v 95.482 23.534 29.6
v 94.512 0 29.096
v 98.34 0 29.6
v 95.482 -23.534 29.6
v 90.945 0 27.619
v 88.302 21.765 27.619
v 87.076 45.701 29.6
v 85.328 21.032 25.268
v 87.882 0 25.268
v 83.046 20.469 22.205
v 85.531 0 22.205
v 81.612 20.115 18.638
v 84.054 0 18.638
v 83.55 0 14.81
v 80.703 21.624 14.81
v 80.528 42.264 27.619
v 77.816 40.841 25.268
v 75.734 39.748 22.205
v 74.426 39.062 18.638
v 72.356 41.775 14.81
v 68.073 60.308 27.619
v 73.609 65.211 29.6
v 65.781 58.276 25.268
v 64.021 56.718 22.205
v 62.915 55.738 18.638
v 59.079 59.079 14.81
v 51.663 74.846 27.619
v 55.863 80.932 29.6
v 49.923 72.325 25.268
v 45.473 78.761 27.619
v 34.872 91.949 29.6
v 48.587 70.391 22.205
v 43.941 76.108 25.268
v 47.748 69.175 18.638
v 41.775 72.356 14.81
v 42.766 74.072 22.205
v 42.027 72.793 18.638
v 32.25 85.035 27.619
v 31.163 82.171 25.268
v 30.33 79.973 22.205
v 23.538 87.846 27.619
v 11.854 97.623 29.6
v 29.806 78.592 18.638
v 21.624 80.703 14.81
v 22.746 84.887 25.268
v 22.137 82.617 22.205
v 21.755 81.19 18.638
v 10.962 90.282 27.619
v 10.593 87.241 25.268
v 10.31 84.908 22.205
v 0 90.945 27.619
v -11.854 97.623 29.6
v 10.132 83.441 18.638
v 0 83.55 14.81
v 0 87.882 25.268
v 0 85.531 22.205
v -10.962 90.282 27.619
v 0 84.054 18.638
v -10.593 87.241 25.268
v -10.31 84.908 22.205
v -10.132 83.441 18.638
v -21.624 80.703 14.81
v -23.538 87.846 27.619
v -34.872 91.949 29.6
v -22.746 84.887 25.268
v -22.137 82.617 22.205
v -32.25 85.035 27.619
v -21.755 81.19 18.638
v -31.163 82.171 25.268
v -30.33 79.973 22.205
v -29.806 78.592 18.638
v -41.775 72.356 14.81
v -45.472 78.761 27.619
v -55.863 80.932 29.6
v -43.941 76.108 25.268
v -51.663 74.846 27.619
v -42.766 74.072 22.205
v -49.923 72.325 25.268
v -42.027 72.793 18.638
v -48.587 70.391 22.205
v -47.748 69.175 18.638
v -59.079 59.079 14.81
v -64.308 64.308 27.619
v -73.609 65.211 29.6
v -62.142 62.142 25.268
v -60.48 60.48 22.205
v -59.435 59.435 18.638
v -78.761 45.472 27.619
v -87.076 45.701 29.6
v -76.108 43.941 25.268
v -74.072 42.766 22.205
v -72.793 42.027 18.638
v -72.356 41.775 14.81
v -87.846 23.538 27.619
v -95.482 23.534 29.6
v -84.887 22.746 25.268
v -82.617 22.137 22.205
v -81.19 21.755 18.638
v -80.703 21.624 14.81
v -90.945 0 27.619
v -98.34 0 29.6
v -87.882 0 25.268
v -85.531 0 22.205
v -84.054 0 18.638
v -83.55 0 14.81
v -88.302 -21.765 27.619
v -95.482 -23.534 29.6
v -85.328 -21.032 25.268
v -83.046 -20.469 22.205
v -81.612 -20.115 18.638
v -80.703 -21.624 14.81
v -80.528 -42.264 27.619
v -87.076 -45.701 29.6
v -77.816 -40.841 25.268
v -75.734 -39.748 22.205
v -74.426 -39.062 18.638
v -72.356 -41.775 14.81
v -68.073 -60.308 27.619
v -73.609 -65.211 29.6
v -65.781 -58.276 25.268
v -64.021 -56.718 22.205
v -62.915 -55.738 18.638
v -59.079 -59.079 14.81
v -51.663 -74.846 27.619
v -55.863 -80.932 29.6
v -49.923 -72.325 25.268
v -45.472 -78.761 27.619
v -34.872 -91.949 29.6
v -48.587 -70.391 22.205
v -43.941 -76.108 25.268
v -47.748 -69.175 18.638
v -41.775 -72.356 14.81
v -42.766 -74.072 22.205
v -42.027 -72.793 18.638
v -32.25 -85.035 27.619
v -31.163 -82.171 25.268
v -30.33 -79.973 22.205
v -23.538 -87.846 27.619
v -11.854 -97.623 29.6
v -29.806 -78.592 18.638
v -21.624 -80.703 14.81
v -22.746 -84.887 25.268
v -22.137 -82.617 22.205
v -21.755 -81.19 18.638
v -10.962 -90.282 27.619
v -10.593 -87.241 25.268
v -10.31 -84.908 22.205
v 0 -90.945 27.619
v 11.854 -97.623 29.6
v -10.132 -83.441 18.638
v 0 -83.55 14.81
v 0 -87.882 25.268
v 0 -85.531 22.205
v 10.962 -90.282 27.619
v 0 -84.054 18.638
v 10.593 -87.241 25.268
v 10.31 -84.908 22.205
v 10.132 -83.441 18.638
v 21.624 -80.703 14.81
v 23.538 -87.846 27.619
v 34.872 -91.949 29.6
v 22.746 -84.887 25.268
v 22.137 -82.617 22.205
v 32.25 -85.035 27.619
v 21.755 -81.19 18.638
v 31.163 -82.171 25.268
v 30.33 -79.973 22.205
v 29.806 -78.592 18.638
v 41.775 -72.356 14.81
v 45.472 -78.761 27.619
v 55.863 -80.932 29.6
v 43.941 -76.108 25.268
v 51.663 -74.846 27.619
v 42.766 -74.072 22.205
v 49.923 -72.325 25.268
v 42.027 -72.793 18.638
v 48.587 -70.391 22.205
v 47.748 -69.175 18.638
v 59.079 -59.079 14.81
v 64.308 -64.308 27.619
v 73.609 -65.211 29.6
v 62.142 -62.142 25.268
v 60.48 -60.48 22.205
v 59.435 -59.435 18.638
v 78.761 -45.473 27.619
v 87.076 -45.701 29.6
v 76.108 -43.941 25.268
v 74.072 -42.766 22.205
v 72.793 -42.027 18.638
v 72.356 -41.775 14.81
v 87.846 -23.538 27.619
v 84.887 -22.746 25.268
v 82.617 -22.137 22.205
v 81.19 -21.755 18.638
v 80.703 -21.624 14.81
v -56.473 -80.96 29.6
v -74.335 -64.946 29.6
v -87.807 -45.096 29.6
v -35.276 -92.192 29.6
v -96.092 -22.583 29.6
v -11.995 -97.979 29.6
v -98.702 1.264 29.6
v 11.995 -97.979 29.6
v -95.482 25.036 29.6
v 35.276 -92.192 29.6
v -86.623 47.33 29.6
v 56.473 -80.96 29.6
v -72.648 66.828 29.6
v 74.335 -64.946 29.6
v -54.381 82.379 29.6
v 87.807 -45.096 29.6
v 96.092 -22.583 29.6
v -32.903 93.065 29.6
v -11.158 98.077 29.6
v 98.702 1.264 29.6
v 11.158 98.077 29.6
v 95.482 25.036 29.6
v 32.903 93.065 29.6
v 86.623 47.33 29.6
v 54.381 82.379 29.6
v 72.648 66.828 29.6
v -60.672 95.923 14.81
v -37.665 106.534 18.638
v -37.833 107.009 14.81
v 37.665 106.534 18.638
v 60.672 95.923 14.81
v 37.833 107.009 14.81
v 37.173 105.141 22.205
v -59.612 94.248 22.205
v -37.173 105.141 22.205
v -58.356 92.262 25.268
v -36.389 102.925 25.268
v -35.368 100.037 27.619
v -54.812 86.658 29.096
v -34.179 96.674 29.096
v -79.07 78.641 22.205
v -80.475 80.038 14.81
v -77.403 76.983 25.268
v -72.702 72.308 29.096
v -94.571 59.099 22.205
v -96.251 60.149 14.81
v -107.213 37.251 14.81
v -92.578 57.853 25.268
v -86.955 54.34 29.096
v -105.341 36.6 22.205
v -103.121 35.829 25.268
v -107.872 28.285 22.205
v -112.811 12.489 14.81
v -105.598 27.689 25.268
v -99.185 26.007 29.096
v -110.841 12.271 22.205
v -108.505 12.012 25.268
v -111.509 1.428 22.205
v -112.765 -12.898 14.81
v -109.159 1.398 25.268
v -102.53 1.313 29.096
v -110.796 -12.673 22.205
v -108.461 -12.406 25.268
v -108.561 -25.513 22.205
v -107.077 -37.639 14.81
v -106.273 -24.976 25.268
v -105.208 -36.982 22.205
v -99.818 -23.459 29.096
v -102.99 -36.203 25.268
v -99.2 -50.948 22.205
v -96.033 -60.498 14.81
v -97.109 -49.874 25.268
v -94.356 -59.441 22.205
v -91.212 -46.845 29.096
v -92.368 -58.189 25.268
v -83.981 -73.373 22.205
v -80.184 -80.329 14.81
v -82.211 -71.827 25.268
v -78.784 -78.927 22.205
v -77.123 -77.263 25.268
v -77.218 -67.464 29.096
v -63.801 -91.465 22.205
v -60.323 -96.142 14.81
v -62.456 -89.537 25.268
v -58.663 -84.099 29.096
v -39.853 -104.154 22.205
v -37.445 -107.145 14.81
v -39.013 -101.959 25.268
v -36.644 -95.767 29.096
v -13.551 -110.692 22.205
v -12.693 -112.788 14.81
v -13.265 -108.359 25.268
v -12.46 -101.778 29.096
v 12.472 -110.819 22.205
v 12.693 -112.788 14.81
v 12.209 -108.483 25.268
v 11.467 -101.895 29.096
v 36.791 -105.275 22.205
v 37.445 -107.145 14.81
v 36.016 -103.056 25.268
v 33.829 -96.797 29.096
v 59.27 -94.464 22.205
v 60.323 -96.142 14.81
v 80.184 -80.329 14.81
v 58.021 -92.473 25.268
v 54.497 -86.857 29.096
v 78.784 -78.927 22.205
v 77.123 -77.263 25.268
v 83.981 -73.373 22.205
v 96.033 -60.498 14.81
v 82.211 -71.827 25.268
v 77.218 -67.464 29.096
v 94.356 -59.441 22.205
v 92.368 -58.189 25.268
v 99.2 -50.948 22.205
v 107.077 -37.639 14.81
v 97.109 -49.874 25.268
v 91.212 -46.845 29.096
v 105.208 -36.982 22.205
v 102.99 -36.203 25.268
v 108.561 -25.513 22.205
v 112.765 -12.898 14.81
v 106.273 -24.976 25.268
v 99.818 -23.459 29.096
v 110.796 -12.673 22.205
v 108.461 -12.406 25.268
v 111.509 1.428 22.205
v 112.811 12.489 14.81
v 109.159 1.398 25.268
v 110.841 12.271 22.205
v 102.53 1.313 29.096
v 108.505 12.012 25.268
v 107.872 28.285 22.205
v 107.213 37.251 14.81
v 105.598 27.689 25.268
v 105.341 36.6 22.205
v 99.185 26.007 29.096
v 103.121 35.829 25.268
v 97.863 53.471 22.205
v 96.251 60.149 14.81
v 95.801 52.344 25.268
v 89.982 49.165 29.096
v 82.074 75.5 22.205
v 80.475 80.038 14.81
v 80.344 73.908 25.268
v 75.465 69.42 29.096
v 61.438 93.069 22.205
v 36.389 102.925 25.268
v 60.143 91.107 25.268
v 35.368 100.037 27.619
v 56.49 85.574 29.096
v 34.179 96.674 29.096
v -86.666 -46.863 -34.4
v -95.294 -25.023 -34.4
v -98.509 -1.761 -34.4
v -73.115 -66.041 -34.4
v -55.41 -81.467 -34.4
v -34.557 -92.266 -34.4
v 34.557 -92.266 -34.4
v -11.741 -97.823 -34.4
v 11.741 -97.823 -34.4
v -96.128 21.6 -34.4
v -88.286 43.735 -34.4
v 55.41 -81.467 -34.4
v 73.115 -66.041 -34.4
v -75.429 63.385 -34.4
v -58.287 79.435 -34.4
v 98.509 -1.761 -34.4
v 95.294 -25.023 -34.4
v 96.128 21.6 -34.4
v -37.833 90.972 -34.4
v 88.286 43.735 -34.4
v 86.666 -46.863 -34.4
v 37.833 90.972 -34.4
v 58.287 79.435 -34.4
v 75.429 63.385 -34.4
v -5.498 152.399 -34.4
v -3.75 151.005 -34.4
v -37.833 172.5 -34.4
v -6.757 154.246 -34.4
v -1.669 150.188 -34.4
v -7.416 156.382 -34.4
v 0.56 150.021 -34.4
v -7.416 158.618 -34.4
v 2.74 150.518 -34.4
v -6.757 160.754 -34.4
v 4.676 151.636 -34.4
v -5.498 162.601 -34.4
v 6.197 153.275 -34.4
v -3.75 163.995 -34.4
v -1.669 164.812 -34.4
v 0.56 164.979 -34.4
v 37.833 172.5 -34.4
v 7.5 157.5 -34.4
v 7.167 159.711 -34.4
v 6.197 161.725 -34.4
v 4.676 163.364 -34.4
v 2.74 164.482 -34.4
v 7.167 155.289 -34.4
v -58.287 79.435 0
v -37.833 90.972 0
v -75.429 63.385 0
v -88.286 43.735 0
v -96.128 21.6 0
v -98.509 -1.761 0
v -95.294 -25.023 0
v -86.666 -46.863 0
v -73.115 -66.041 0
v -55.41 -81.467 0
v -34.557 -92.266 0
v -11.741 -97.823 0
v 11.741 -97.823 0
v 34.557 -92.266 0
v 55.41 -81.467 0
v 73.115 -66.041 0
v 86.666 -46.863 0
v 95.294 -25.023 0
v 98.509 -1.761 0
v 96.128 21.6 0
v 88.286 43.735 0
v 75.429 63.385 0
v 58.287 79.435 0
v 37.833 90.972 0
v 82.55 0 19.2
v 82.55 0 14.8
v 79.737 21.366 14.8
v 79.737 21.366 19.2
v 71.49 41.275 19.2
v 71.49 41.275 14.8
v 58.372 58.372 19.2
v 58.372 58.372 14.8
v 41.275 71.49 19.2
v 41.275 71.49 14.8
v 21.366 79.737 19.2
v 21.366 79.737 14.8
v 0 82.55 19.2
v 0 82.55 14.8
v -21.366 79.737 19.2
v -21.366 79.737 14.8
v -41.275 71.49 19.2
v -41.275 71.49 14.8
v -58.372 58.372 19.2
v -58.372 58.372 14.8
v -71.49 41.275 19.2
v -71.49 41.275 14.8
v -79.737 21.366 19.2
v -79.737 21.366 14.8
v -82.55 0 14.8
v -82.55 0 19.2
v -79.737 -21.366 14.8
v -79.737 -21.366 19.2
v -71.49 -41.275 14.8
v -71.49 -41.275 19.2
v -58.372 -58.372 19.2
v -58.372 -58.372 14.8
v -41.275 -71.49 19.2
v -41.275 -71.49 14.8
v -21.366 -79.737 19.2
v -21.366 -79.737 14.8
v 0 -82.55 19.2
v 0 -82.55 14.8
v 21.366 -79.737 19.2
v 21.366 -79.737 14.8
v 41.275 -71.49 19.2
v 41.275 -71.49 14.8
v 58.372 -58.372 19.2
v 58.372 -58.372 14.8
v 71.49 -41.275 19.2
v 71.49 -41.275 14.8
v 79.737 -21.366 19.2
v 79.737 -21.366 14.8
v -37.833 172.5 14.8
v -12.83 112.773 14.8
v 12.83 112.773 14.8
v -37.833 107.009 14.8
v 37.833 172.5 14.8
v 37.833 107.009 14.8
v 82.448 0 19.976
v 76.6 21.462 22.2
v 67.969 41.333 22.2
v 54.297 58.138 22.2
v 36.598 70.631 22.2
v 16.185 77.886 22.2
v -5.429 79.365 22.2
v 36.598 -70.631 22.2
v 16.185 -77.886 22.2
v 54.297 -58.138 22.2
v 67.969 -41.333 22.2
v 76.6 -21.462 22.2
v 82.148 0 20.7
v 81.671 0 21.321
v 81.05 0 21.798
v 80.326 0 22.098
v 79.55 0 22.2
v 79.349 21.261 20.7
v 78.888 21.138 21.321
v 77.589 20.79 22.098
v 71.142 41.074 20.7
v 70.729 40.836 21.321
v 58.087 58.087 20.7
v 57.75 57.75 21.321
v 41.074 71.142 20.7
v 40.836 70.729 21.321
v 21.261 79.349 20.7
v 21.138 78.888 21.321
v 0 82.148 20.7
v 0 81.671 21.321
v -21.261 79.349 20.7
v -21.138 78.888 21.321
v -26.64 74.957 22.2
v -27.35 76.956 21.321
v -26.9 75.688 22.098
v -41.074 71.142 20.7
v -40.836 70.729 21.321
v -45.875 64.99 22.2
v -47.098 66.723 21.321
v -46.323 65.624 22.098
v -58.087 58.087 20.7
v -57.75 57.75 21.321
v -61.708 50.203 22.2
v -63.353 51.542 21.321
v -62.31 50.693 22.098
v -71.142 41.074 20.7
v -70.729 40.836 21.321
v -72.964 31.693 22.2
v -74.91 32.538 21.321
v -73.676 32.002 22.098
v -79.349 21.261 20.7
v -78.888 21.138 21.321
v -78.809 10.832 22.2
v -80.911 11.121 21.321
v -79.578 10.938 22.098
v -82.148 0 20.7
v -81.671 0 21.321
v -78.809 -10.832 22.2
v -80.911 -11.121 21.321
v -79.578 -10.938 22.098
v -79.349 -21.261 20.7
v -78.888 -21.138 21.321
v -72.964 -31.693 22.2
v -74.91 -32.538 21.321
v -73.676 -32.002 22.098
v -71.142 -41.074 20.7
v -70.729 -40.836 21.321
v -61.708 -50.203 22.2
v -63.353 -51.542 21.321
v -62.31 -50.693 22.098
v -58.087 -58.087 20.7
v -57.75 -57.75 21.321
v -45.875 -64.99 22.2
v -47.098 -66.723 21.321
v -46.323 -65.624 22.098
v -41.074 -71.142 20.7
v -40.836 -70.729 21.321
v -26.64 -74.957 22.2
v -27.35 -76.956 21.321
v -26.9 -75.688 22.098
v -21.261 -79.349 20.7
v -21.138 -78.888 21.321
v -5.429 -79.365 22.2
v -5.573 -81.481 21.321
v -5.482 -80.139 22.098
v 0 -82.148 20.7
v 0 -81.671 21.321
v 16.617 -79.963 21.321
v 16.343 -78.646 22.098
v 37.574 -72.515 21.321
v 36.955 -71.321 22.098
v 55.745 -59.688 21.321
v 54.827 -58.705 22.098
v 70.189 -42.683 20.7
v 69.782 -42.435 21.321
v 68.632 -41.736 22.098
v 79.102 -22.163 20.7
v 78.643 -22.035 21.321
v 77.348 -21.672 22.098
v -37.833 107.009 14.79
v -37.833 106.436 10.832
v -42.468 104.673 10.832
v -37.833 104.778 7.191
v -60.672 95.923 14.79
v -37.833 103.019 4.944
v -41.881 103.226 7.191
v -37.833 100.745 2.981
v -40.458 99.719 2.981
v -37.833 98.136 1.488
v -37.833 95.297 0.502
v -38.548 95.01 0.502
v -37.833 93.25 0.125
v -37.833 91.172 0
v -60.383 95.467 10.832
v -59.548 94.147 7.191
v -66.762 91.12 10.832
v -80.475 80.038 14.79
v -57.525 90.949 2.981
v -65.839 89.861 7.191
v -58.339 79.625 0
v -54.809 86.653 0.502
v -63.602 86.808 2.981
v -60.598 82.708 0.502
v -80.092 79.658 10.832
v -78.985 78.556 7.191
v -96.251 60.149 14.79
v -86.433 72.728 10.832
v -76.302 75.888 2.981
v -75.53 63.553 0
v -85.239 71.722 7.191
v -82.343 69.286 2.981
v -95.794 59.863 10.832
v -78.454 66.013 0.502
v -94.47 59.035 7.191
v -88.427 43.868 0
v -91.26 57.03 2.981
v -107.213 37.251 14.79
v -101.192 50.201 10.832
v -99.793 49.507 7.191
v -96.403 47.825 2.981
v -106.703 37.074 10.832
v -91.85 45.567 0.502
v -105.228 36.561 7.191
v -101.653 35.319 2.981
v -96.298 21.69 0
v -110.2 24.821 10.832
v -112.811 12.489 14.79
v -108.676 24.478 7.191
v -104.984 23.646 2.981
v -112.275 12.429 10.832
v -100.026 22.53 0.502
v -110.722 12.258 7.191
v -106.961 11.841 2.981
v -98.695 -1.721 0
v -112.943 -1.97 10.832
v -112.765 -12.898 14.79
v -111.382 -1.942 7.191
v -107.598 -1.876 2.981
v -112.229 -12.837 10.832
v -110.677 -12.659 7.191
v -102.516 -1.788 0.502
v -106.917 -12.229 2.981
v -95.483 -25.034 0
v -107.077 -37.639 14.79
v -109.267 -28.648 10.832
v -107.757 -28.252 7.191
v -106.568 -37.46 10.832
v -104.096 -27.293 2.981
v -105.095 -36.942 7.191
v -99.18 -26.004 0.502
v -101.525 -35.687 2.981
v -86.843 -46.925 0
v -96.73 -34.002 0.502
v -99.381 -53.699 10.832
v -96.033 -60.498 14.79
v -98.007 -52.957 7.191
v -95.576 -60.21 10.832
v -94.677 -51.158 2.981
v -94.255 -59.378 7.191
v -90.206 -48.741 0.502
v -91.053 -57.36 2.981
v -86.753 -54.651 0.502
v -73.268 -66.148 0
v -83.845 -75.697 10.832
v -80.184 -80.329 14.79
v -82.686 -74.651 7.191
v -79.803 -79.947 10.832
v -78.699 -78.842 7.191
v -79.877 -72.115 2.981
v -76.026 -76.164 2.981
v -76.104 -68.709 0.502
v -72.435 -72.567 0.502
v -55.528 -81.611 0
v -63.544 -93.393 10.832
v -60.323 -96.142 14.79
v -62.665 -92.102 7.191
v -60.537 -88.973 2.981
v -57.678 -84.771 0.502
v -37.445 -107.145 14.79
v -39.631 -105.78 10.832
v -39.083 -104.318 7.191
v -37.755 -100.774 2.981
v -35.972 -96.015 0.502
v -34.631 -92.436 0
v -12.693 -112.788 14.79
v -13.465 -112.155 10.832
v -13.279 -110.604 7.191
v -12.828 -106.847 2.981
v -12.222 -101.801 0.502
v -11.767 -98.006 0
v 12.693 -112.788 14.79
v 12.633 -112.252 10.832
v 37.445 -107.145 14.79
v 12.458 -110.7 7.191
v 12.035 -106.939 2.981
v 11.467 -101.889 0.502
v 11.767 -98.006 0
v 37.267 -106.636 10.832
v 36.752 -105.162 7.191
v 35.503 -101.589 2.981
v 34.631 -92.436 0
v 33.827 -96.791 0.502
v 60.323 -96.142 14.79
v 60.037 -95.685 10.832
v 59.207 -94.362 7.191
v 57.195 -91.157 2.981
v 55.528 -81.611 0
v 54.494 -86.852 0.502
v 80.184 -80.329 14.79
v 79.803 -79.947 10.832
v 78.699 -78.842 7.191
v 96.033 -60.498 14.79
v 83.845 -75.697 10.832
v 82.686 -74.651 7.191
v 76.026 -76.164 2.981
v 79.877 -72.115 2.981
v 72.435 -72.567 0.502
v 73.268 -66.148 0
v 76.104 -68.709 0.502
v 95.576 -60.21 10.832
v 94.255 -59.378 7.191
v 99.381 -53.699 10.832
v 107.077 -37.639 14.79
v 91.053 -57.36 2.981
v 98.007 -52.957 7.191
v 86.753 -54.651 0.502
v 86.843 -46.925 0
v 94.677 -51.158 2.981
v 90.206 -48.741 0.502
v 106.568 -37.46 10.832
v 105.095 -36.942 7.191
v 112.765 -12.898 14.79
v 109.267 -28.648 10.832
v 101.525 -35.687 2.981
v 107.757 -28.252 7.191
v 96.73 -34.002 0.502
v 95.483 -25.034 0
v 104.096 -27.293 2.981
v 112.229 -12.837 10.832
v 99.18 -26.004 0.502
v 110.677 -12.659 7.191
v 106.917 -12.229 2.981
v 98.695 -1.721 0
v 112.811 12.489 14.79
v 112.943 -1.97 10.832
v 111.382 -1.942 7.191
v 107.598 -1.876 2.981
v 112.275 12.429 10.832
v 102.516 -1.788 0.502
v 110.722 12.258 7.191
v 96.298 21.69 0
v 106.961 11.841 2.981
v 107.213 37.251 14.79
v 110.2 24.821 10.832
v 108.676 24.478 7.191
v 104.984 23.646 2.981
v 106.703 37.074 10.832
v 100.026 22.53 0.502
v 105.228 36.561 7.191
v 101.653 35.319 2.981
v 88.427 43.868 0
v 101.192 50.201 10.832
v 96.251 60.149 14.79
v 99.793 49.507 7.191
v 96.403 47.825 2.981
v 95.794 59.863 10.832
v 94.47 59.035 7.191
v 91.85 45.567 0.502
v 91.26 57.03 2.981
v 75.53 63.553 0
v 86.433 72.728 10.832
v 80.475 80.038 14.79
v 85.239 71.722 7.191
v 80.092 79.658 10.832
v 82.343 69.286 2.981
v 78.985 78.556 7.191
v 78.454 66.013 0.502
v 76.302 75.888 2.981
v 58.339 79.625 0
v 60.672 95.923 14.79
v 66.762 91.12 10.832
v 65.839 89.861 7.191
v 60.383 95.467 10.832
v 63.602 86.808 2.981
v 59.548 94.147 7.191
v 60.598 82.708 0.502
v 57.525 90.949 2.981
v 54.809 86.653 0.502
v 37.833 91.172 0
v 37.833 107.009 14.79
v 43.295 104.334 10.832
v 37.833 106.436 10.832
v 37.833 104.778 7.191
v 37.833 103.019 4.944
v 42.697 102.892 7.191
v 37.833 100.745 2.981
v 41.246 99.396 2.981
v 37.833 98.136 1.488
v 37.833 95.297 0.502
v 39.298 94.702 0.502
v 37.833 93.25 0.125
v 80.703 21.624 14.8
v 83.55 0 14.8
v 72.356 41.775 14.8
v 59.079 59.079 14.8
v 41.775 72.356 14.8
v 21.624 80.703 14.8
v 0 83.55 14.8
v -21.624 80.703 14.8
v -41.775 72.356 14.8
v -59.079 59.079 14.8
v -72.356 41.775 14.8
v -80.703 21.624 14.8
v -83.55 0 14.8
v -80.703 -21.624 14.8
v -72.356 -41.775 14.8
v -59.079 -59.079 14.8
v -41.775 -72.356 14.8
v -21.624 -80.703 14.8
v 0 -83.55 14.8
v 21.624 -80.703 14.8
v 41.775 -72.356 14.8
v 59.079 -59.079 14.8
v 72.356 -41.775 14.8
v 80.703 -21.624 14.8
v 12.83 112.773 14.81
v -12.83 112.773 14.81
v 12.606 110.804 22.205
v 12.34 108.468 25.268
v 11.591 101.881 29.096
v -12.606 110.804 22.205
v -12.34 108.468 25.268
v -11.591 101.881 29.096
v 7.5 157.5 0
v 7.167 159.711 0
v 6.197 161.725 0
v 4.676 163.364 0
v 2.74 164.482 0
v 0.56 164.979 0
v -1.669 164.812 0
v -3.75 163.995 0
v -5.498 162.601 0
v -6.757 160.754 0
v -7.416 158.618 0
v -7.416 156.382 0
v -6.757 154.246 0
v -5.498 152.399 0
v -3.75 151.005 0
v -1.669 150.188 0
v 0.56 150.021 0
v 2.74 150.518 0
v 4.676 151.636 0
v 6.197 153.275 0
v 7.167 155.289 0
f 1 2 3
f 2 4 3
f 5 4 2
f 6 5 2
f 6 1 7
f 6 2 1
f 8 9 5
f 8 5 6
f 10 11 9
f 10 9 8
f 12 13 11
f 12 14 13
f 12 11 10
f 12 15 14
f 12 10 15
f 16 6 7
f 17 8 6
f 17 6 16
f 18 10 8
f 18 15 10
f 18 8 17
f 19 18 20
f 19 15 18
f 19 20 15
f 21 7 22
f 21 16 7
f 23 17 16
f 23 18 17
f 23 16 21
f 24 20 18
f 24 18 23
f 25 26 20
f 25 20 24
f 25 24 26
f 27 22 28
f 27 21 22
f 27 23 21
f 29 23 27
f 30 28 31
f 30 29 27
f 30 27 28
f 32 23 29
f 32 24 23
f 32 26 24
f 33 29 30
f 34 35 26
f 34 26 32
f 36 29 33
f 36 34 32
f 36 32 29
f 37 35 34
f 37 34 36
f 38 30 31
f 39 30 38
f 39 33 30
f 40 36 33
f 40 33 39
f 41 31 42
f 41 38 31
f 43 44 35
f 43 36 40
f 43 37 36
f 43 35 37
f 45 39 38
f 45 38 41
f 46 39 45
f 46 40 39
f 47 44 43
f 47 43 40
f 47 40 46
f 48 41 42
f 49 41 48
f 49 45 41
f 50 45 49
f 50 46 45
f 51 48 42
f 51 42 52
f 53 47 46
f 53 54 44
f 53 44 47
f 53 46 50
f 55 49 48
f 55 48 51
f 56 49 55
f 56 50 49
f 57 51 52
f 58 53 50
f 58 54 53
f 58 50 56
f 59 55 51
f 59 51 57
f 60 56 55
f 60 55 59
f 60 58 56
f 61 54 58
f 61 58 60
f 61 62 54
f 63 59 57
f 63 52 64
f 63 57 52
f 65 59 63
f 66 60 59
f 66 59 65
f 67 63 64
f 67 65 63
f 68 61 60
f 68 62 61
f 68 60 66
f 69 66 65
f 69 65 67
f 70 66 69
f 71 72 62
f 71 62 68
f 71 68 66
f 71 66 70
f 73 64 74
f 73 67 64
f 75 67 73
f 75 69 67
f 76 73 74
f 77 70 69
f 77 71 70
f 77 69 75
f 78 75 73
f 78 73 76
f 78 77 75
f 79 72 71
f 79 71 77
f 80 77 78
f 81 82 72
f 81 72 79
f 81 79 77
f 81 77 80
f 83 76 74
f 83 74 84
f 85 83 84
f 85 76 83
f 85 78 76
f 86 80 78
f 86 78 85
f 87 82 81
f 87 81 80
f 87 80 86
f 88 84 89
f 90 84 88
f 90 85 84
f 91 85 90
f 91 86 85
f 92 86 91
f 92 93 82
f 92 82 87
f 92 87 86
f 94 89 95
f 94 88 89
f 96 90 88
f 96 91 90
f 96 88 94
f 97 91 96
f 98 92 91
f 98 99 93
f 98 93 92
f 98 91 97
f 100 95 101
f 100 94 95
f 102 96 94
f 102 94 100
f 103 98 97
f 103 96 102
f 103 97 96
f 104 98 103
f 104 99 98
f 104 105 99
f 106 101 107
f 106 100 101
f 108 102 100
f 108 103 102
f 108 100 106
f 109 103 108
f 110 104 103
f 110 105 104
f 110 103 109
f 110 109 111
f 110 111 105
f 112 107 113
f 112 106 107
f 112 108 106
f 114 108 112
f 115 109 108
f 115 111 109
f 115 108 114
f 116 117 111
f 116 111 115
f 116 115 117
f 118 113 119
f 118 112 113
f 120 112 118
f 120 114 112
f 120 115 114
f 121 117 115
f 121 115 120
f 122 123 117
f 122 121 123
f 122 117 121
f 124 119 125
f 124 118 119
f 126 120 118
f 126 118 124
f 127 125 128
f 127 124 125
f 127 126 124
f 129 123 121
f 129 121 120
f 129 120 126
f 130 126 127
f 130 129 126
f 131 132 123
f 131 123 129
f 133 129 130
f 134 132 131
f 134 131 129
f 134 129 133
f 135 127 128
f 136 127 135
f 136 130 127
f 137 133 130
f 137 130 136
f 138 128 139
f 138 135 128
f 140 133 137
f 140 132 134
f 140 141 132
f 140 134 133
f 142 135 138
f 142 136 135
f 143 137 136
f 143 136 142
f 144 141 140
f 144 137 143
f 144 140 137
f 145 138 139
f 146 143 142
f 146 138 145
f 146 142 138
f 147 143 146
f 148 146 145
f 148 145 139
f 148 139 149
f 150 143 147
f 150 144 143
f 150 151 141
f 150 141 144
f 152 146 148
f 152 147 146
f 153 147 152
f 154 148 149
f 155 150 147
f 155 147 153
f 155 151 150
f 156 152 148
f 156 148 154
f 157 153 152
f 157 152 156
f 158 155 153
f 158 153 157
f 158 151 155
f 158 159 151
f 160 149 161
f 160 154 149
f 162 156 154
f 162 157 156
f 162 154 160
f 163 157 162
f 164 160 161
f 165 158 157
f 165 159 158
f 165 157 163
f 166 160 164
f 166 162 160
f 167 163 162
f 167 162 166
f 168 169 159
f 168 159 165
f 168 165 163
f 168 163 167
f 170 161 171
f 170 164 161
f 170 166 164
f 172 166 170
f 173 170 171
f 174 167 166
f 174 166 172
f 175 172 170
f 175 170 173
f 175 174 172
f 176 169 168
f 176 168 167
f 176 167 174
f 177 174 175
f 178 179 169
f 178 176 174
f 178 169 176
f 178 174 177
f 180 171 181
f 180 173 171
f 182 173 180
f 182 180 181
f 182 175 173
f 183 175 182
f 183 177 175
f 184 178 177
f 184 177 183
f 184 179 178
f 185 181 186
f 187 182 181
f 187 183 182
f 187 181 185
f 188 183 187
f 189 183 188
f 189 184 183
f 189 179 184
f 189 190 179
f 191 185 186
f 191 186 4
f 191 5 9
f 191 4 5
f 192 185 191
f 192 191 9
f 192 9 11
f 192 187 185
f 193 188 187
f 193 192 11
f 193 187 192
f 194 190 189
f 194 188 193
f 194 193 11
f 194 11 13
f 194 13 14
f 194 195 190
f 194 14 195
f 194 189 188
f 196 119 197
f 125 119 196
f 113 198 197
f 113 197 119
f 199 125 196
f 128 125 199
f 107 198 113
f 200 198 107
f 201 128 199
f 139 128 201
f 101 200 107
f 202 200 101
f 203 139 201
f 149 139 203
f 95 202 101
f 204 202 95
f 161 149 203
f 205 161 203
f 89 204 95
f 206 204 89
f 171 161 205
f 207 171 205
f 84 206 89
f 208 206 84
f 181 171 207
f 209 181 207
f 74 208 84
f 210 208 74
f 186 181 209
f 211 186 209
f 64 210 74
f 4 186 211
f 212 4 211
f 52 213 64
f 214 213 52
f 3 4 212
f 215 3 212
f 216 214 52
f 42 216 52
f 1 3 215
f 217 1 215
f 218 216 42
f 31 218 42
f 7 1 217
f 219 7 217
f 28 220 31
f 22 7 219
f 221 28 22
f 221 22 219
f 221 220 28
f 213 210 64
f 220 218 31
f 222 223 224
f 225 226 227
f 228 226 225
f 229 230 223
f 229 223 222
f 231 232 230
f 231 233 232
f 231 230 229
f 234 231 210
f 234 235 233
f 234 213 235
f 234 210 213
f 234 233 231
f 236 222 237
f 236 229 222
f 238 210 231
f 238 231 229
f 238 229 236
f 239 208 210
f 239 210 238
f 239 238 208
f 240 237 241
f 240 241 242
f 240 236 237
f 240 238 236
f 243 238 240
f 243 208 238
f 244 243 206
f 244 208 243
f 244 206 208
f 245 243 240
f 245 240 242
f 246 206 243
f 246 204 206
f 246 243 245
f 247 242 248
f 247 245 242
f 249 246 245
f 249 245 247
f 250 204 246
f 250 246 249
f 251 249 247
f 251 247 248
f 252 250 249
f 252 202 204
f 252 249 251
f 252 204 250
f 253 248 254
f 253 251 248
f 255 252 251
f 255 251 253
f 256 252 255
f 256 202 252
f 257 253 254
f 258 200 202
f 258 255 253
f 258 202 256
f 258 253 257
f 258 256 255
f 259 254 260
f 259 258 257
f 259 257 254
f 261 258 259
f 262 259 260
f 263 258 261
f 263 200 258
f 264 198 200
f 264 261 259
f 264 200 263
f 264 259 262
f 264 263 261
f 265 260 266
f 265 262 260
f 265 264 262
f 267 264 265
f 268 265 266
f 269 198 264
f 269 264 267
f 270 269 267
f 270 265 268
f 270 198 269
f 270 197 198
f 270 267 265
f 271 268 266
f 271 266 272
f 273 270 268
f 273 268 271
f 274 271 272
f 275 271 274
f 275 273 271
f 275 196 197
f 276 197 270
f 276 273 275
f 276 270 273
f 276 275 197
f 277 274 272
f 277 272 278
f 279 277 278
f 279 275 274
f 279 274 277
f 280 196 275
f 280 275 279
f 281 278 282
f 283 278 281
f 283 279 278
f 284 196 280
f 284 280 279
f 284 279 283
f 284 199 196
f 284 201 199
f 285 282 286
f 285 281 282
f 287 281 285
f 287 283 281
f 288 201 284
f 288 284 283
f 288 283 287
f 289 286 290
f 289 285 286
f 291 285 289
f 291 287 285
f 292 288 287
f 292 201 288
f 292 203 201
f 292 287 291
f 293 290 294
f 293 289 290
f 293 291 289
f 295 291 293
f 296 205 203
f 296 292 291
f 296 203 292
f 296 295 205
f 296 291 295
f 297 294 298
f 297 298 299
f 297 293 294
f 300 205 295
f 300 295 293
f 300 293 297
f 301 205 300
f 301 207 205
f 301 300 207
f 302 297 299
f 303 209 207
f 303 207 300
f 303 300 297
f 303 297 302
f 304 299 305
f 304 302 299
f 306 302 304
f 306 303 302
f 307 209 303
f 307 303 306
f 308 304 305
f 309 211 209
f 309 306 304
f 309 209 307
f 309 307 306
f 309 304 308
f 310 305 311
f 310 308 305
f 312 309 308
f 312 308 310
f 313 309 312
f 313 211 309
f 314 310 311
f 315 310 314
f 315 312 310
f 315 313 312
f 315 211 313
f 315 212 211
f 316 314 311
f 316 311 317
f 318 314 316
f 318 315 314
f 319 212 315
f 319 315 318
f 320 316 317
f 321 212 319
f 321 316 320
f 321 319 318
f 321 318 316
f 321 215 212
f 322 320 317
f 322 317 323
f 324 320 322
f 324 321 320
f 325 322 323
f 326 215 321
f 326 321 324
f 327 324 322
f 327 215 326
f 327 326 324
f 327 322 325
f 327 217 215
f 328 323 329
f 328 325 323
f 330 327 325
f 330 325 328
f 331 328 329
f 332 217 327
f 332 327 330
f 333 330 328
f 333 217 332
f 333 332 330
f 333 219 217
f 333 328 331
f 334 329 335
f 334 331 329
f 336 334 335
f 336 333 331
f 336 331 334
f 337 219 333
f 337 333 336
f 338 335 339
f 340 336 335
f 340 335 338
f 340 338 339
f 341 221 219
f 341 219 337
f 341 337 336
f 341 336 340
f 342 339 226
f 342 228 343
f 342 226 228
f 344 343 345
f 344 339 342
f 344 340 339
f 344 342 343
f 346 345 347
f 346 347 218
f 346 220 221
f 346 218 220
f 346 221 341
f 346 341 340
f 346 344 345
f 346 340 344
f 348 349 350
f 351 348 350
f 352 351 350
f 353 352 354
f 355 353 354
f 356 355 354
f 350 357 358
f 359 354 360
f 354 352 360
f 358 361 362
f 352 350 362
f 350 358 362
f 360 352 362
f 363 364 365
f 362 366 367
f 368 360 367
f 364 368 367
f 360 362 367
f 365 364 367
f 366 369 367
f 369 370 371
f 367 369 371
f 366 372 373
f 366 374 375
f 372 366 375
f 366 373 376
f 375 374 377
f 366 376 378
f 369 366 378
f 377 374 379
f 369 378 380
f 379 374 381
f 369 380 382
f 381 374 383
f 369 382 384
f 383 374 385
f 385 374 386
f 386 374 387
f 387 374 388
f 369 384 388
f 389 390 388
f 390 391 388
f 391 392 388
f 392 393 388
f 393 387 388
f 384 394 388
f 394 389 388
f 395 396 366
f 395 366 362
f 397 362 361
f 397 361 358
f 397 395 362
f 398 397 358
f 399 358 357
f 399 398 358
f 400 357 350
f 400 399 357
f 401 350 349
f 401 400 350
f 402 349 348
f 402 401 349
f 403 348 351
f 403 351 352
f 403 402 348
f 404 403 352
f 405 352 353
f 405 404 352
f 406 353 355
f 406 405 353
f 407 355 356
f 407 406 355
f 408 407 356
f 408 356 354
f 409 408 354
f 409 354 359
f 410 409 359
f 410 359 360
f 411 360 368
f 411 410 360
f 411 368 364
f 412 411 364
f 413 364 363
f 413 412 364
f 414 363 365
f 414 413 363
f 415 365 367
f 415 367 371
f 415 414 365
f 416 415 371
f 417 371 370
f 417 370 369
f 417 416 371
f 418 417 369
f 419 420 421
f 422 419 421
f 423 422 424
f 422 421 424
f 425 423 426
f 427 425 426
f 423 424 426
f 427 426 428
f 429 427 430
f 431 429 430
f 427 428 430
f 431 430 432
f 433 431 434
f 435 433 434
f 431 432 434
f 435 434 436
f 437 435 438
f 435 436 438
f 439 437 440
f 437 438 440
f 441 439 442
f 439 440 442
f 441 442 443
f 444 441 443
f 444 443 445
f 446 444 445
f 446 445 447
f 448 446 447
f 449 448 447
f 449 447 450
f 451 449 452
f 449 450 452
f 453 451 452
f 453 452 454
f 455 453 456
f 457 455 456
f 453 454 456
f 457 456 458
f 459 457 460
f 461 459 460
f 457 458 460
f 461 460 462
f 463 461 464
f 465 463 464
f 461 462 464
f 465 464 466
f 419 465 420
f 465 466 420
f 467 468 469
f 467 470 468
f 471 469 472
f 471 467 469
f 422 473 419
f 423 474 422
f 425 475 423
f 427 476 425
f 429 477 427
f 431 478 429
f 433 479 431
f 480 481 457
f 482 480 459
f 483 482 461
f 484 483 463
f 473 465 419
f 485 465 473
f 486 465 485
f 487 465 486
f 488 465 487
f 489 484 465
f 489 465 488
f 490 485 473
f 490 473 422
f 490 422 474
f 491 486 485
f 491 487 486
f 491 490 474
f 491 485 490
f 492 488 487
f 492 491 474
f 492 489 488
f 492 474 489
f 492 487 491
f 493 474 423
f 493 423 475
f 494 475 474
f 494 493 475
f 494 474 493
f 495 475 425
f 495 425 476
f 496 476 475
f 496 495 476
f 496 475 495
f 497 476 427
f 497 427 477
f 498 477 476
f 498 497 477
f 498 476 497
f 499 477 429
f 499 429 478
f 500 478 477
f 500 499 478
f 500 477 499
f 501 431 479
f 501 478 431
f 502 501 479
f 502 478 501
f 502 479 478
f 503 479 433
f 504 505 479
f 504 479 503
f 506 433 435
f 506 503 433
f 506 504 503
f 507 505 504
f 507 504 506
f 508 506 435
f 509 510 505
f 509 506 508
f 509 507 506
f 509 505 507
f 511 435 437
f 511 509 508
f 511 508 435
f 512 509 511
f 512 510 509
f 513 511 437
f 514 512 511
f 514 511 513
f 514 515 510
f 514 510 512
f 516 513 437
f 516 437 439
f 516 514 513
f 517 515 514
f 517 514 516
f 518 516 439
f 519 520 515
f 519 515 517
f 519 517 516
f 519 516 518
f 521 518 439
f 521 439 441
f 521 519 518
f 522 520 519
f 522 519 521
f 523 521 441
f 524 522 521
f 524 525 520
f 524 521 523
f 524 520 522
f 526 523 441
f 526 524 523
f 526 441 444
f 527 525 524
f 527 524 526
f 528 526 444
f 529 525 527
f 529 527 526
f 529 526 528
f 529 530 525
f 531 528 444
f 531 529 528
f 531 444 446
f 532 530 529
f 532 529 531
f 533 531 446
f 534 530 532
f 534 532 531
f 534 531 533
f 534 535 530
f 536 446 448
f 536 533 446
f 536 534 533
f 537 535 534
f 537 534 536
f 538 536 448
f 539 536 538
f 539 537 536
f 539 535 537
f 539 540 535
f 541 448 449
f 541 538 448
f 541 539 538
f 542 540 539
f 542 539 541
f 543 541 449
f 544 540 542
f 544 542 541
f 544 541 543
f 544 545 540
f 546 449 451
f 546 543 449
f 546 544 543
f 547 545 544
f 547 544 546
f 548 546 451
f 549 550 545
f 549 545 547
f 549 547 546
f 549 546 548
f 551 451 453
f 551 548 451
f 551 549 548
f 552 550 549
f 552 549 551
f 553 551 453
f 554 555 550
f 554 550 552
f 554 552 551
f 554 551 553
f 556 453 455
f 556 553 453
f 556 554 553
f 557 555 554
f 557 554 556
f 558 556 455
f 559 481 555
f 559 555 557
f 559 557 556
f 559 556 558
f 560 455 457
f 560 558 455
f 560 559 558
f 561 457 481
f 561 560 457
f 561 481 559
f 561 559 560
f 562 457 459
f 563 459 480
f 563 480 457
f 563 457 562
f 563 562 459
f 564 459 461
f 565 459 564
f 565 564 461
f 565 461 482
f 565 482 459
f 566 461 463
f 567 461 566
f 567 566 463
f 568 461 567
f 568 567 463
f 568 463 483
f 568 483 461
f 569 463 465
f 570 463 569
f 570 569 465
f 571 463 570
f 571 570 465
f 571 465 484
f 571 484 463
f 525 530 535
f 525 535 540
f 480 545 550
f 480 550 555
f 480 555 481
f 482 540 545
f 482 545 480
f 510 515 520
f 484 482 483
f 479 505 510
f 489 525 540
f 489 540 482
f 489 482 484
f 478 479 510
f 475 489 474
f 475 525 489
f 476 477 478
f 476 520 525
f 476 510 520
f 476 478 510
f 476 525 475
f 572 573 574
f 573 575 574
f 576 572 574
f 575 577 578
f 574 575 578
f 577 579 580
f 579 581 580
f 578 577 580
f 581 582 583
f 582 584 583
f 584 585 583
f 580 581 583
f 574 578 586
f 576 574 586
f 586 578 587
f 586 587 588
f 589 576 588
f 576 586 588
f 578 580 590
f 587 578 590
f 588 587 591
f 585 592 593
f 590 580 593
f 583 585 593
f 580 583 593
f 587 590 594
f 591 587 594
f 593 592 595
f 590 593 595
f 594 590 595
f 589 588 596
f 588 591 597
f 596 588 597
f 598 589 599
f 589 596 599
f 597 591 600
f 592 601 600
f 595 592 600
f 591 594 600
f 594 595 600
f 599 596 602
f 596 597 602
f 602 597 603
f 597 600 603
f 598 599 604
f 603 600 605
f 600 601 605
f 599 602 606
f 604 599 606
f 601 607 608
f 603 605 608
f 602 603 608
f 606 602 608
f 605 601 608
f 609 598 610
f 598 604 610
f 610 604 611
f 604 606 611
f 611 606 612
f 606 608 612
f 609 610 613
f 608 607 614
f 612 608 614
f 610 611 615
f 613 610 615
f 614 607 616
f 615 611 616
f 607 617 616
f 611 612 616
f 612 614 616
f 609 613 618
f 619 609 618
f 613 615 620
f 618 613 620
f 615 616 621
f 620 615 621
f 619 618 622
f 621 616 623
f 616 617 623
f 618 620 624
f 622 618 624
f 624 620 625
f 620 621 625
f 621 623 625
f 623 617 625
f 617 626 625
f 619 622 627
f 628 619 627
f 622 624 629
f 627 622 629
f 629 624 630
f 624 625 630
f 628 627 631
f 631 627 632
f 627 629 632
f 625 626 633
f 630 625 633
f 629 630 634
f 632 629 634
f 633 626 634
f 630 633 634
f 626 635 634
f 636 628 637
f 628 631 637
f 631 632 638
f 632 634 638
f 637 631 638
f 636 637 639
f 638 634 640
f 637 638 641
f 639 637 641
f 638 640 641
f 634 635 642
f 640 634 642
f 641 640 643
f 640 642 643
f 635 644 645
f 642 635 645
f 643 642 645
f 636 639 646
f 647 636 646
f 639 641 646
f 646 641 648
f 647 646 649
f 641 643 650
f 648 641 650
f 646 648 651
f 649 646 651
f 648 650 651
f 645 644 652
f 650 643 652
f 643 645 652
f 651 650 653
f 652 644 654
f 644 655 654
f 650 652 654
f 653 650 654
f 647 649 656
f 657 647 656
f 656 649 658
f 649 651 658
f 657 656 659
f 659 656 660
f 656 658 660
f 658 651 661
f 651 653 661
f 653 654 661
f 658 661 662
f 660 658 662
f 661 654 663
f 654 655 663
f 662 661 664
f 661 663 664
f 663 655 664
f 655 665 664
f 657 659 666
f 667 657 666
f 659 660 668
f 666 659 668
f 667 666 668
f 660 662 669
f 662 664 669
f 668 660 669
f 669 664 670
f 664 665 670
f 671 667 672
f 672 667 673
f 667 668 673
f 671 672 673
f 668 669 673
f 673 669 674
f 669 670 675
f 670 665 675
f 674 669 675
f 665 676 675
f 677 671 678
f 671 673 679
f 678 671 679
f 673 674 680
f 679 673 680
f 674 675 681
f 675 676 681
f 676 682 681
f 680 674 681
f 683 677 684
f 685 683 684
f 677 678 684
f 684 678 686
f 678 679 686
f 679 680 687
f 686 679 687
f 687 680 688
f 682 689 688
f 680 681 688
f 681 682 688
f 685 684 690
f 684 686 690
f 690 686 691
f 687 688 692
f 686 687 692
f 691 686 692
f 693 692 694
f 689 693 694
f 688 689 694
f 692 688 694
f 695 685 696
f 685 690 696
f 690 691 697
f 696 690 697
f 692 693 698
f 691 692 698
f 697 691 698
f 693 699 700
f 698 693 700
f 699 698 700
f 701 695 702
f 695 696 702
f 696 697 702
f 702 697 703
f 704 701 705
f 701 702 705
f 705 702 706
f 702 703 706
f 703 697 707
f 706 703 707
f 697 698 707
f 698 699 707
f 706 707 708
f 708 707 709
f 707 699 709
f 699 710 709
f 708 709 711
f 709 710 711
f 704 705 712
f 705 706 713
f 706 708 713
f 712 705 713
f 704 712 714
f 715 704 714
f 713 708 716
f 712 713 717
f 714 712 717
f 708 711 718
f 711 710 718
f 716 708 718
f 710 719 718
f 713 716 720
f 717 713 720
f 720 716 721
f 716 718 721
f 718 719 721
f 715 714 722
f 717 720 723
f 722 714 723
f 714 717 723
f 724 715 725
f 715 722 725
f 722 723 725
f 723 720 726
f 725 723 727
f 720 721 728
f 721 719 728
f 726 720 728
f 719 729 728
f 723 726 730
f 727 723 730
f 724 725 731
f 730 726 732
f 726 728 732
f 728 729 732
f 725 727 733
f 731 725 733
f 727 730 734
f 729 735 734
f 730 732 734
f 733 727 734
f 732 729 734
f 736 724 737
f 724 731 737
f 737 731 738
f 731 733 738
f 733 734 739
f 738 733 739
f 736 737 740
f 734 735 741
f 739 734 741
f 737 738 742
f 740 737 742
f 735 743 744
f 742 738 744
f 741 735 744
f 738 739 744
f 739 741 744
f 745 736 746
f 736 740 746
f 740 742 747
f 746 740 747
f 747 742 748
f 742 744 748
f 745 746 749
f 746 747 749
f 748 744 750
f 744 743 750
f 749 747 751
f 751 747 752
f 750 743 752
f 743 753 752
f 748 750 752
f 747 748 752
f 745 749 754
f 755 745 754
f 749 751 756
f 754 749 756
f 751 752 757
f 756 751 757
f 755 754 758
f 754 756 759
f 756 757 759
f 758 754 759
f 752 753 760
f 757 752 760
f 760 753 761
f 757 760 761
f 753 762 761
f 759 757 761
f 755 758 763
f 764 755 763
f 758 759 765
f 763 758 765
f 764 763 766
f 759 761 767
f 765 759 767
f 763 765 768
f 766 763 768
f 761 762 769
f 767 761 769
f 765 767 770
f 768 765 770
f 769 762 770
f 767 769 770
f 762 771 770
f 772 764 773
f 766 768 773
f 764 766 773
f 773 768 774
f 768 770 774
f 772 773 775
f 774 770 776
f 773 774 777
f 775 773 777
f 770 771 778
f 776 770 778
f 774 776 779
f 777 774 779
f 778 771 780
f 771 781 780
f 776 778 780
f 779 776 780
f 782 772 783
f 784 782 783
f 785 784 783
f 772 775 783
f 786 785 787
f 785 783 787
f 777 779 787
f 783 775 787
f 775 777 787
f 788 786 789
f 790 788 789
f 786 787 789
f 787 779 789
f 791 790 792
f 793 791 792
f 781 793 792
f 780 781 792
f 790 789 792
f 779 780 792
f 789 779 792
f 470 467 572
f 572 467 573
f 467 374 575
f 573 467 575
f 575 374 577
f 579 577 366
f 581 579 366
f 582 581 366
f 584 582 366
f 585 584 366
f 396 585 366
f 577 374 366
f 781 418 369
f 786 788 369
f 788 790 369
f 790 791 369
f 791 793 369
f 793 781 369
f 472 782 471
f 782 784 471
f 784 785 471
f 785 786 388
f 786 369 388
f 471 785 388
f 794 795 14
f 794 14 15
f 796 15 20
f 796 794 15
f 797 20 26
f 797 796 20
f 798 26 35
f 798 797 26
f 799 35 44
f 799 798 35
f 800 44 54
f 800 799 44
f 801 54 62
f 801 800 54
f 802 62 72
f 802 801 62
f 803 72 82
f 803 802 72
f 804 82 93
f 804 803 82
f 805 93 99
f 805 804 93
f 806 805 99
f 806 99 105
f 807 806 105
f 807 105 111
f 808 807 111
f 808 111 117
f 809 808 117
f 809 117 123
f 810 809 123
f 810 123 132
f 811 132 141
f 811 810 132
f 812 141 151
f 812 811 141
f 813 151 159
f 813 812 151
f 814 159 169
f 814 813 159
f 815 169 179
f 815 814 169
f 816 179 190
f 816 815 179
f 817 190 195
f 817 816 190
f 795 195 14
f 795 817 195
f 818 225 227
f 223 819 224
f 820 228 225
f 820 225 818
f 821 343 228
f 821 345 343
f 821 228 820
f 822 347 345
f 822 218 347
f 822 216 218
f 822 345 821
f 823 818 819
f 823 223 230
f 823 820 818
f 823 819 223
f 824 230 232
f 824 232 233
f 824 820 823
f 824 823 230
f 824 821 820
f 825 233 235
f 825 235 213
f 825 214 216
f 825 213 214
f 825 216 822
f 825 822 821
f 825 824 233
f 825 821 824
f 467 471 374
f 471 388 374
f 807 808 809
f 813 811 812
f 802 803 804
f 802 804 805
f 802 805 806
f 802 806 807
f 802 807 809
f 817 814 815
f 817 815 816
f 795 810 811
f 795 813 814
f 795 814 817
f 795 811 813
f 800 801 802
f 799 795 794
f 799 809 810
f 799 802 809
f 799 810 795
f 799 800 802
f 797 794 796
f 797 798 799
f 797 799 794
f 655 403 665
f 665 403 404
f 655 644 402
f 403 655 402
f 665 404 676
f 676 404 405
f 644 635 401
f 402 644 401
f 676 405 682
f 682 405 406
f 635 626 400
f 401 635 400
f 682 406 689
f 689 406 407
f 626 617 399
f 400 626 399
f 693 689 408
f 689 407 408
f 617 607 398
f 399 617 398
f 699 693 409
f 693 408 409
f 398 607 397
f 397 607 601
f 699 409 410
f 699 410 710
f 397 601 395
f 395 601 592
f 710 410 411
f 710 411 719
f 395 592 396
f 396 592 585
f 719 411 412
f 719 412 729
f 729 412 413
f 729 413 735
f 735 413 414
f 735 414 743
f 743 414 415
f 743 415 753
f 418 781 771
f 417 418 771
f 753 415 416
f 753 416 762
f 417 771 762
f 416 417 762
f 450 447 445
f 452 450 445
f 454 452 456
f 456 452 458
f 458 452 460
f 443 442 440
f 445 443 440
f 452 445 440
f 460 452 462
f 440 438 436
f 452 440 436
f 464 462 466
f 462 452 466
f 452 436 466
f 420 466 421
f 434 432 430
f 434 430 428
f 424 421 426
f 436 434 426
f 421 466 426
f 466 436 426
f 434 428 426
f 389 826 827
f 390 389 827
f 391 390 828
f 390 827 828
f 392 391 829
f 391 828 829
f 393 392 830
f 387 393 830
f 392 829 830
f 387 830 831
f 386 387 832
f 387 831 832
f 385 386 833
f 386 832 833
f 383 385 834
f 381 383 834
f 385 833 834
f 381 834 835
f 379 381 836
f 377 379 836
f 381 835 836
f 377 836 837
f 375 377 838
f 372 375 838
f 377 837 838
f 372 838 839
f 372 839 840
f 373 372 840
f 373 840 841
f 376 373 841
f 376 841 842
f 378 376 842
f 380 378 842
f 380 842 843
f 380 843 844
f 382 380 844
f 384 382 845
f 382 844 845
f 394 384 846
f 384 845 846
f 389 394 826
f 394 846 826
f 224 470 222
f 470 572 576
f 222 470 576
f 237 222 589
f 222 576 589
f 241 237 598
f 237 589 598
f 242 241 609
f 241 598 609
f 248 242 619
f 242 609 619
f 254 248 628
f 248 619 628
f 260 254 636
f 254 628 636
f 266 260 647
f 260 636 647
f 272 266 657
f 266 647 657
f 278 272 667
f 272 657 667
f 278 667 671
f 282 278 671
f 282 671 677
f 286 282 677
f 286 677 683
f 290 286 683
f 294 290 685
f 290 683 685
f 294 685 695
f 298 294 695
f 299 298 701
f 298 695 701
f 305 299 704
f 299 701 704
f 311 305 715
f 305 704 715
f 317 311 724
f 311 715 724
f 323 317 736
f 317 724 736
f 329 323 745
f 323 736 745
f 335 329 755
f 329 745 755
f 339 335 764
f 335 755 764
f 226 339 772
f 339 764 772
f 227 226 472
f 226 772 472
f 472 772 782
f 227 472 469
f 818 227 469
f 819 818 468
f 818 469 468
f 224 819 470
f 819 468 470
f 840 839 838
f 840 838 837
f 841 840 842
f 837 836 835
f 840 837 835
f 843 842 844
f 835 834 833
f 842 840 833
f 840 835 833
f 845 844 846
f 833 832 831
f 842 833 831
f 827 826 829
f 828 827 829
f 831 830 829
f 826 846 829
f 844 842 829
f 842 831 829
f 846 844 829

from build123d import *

# Parameters (mm, degrees)
F0_R     = 7.5
F0_R_2   = 83.55
F0_R_3   = 82.55
F3_DEPTH = 34.4
F4_DEPTH = 14.8
F5_START = 14.8
F5_DEPTH = 14.8
F6_R     = 14.79
F7_START = 14.8
F7_DEPTH = 7.4
F8_R     = 3


# Not quite as in the source:
# - a feature names something its author has since deleted; it is built from what else it names


with BuildPart() as f3:
    # F0 (on Top) → F3 (new body)
    with BuildSketch(Plane.XY):
        with BuildLine():
            ThreePointArc((-37.8333333333, 107.0088262196), (0, 113.5), (37.8333333333, 107.0088262196))
            Line((37.8333333333, 107.0088262196), (37.8333333333, 172.5))
            Line((37.8333333333, 172.5), (-37.8333333333, 172.5))
            Line((-37.8333333333, 172.5), (-37.8333333333, 107.0088262196))
        make_face()
        with Locations((0, 157.5)):
            Circle(F0_R, mode=Mode.SUBTRACT)
        with BuildLine():
            Line((37.8333333333, 90.9715038564), (37.8333333333, 107.0088262196))
            ThreePointArc((37.8333333333, 107.0088262196), (0, 113.5), (-37.8333333333, 107.0088262196))
            Line((-37.8333333333, 107.0088262196), (-37.8333333333, 90.9715038564))
            ThreePointArc((-37.8333333333, 90.9715038564), (0, 98.525), (37.8333333333, 90.9715038564))
        make_face()
        with BuildLine():
            ThreePointArc((98.525, 0), (81.9594558049, 54.6792760483), (37.8333333333, 90.9715038564))
            ThreePointArc((37.8333333333, 90.9715038564), (0, 98.525), (-37.8333333333, 90.9715038564))
            ThreePointArc((-37.8333333333, 90.9715038564), (-54.6792760483, -81.9594558049), (98.525, 0))
        make_face()
        Circle(F0_R_2, mode=Mode.SUBTRACT)
        Circle(F0_R_2)
        Circle(F0_R_3, mode=Mode.SUBTRACT)
        Circle(F0_R_3)
    extrude(amount=-F3_DEPTH)

    # F0 (on Top) → F4 (join)
    with BuildSketch(Plane.XY):
        with BuildLine():
            ThreePointArc((-37.8333333333, 107.0088262196), (-65.529255553, -92.6723619353), (113.5, 0))
            ThreePointArc((113.5, 0), (92.6723619353, 65.529255553), (37.8333333333, 107.0088262196))
            Line((37.8333333333, 107.0088262196), (37.8333333333, 90.9715038564))
            ThreePointArc((37.8333333333, 90.9715038564), (81.9594558049, 54.6792760483), (98.525, 0))
            ThreePointArc((98.525, 0), (-54.6792760483, -81.9594558049), (-37.8333333333, 90.9715038564))
            Line((-37.8333333333, 90.9715038564), (-37.8333333333, 107.0088262196))
        make_face()
        with BuildLine():
            ThreePointArc((98.525, 0), (81.9594558049, 54.6792760483), (37.8333333333, 90.9715038564))
            ThreePointArc((37.8333333333, 90.9715038564), (0, 98.525), (-37.8333333333, 90.9715038564))
            ThreePointArc((-37.8333333333, 90.9715038564), (-54.6792760483, -81.9594558049), (98.525, 0))
        make_face()
        Circle(F0_R_2, mode=Mode.SUBTRACT)
        Circle(F0_R_2)
        Circle(F0_R_3, mode=Mode.SUBTRACT)
        Circle(F0_R_3)
        with BuildLine():
            Line((37.8333333333, 90.9715038564), (37.8333333333, 107.0088262196))
            ThreePointArc((37.8333333333, 107.0088262196), (0, 113.5), (-37.8333333333, 107.0088262196))
            Line((-37.8333333333, 107.0088262196), (-37.8333333333, 90.9715038564))
            ThreePointArc((-37.8333333333, 90.9715038564), (0, 98.525), (37.8333333333, 90.9715038564))
        make_face()
        with BuildLine():
            ThreePointArc((-37.8333333333, 107.0088262196), (0, 113.5), (37.8333333333, 107.0088262196))
            Line((37.8333333333, 107.0088262196), (37.8333333333, 172.5))
            Line((37.8333333333, 172.5), (-37.8333333333, 172.5))
            Line((-37.8333333333, 172.5), (-37.8333333333, 107.0088262196))
        make_face()
        with Locations((0, 157.5)):
            Circle(F0_R, mode=Mode.SUBTRACT)
        with Locations((0, 157.5)):
            Circle(F0_R)
    extrude(amount=F4_DEPTH)

    # F0 (on Top) → F5 (join)
    with BuildSketch(Plane.XY.offset(F5_START)):
        with BuildLine():
            ThreePointArc((-37.8333333333, 107.0088262196), (-65.529255553, -92.6723619353), (113.5, 0))
            ThreePointArc((113.5, 0), (92.6723619353, 65.529255553), (37.8333333333, 107.0088262196))
            Line((37.8333333333, 107.0088262196), (37.8333333333, 90.9715038564))
            ThreePointArc((37.8333333333, 90.9715038564), (81.9594558049, 54.6792760483), (98.525, 0))
            ThreePointArc((98.525, 0), (-54.6792760483, -81.9594558049), (-37.8333333333, 90.9715038564))
            Line((-37.8333333333, 90.9715038564), (-37.8333333333, 107.0088262196))
        make_face()
        with BuildLine():
            ThreePointArc((98.525, 0), (81.9594558049, 54.6792760483), (37.8333333333, 90.9715038564))
            ThreePointArc((37.8333333333, 90.9715038564), (0, 98.525), (-37.8333333333, 90.9715038564))
            ThreePointArc((-37.8333333333, 90.9715038564), (-54.6792760483, -81.9594558049), (98.525, 0))
        make_face()
        Circle(F0_R_2, mode=Mode.SUBTRACT)
        with BuildLine():
            Line((37.8333333333, 90.9715038564), (37.8333333333, 107.0088262196))
            ThreePointArc((37.8333333333, 107.0088262196), (0, 113.5), (-37.8333333333, 107.0088262196))
            Line((-37.8333333333, 107.0088262196), (-37.8333333333, 90.9715038564))
            ThreePointArc((-37.8333333333, 90.9715038564), (0, 98.525), (37.8333333333, 90.9715038564))
        make_face()
    extrude(amount=F5_DEPTH)

    # F6
    f6_edges = [f3.edges().sort_by_distance(p)[0] for p in [
        (-37.833333, -107.008826, 29.6),
        (-83.55, 0, 29.6),
        (0, -113.5, 0),
    ]]
    fillet(f6_edges, radius=F6_R)


with BuildPart() as f7:
    # F0 (on Top) → F7 (new body)
    with BuildSketch(Plane.XY.offset(F7_START)):
        Circle(F0_R_3)
    extrude(amount=F7_DEPTH)

    # F8
    f8_edges = [f7.edges().sort_by_distance(p)[0] for p in [
        (-82.55, 0, 22.2),
    ]]
    fillet(f8_edges, radius=F8_R)


solid = Compound([f3.part, f7.part])
